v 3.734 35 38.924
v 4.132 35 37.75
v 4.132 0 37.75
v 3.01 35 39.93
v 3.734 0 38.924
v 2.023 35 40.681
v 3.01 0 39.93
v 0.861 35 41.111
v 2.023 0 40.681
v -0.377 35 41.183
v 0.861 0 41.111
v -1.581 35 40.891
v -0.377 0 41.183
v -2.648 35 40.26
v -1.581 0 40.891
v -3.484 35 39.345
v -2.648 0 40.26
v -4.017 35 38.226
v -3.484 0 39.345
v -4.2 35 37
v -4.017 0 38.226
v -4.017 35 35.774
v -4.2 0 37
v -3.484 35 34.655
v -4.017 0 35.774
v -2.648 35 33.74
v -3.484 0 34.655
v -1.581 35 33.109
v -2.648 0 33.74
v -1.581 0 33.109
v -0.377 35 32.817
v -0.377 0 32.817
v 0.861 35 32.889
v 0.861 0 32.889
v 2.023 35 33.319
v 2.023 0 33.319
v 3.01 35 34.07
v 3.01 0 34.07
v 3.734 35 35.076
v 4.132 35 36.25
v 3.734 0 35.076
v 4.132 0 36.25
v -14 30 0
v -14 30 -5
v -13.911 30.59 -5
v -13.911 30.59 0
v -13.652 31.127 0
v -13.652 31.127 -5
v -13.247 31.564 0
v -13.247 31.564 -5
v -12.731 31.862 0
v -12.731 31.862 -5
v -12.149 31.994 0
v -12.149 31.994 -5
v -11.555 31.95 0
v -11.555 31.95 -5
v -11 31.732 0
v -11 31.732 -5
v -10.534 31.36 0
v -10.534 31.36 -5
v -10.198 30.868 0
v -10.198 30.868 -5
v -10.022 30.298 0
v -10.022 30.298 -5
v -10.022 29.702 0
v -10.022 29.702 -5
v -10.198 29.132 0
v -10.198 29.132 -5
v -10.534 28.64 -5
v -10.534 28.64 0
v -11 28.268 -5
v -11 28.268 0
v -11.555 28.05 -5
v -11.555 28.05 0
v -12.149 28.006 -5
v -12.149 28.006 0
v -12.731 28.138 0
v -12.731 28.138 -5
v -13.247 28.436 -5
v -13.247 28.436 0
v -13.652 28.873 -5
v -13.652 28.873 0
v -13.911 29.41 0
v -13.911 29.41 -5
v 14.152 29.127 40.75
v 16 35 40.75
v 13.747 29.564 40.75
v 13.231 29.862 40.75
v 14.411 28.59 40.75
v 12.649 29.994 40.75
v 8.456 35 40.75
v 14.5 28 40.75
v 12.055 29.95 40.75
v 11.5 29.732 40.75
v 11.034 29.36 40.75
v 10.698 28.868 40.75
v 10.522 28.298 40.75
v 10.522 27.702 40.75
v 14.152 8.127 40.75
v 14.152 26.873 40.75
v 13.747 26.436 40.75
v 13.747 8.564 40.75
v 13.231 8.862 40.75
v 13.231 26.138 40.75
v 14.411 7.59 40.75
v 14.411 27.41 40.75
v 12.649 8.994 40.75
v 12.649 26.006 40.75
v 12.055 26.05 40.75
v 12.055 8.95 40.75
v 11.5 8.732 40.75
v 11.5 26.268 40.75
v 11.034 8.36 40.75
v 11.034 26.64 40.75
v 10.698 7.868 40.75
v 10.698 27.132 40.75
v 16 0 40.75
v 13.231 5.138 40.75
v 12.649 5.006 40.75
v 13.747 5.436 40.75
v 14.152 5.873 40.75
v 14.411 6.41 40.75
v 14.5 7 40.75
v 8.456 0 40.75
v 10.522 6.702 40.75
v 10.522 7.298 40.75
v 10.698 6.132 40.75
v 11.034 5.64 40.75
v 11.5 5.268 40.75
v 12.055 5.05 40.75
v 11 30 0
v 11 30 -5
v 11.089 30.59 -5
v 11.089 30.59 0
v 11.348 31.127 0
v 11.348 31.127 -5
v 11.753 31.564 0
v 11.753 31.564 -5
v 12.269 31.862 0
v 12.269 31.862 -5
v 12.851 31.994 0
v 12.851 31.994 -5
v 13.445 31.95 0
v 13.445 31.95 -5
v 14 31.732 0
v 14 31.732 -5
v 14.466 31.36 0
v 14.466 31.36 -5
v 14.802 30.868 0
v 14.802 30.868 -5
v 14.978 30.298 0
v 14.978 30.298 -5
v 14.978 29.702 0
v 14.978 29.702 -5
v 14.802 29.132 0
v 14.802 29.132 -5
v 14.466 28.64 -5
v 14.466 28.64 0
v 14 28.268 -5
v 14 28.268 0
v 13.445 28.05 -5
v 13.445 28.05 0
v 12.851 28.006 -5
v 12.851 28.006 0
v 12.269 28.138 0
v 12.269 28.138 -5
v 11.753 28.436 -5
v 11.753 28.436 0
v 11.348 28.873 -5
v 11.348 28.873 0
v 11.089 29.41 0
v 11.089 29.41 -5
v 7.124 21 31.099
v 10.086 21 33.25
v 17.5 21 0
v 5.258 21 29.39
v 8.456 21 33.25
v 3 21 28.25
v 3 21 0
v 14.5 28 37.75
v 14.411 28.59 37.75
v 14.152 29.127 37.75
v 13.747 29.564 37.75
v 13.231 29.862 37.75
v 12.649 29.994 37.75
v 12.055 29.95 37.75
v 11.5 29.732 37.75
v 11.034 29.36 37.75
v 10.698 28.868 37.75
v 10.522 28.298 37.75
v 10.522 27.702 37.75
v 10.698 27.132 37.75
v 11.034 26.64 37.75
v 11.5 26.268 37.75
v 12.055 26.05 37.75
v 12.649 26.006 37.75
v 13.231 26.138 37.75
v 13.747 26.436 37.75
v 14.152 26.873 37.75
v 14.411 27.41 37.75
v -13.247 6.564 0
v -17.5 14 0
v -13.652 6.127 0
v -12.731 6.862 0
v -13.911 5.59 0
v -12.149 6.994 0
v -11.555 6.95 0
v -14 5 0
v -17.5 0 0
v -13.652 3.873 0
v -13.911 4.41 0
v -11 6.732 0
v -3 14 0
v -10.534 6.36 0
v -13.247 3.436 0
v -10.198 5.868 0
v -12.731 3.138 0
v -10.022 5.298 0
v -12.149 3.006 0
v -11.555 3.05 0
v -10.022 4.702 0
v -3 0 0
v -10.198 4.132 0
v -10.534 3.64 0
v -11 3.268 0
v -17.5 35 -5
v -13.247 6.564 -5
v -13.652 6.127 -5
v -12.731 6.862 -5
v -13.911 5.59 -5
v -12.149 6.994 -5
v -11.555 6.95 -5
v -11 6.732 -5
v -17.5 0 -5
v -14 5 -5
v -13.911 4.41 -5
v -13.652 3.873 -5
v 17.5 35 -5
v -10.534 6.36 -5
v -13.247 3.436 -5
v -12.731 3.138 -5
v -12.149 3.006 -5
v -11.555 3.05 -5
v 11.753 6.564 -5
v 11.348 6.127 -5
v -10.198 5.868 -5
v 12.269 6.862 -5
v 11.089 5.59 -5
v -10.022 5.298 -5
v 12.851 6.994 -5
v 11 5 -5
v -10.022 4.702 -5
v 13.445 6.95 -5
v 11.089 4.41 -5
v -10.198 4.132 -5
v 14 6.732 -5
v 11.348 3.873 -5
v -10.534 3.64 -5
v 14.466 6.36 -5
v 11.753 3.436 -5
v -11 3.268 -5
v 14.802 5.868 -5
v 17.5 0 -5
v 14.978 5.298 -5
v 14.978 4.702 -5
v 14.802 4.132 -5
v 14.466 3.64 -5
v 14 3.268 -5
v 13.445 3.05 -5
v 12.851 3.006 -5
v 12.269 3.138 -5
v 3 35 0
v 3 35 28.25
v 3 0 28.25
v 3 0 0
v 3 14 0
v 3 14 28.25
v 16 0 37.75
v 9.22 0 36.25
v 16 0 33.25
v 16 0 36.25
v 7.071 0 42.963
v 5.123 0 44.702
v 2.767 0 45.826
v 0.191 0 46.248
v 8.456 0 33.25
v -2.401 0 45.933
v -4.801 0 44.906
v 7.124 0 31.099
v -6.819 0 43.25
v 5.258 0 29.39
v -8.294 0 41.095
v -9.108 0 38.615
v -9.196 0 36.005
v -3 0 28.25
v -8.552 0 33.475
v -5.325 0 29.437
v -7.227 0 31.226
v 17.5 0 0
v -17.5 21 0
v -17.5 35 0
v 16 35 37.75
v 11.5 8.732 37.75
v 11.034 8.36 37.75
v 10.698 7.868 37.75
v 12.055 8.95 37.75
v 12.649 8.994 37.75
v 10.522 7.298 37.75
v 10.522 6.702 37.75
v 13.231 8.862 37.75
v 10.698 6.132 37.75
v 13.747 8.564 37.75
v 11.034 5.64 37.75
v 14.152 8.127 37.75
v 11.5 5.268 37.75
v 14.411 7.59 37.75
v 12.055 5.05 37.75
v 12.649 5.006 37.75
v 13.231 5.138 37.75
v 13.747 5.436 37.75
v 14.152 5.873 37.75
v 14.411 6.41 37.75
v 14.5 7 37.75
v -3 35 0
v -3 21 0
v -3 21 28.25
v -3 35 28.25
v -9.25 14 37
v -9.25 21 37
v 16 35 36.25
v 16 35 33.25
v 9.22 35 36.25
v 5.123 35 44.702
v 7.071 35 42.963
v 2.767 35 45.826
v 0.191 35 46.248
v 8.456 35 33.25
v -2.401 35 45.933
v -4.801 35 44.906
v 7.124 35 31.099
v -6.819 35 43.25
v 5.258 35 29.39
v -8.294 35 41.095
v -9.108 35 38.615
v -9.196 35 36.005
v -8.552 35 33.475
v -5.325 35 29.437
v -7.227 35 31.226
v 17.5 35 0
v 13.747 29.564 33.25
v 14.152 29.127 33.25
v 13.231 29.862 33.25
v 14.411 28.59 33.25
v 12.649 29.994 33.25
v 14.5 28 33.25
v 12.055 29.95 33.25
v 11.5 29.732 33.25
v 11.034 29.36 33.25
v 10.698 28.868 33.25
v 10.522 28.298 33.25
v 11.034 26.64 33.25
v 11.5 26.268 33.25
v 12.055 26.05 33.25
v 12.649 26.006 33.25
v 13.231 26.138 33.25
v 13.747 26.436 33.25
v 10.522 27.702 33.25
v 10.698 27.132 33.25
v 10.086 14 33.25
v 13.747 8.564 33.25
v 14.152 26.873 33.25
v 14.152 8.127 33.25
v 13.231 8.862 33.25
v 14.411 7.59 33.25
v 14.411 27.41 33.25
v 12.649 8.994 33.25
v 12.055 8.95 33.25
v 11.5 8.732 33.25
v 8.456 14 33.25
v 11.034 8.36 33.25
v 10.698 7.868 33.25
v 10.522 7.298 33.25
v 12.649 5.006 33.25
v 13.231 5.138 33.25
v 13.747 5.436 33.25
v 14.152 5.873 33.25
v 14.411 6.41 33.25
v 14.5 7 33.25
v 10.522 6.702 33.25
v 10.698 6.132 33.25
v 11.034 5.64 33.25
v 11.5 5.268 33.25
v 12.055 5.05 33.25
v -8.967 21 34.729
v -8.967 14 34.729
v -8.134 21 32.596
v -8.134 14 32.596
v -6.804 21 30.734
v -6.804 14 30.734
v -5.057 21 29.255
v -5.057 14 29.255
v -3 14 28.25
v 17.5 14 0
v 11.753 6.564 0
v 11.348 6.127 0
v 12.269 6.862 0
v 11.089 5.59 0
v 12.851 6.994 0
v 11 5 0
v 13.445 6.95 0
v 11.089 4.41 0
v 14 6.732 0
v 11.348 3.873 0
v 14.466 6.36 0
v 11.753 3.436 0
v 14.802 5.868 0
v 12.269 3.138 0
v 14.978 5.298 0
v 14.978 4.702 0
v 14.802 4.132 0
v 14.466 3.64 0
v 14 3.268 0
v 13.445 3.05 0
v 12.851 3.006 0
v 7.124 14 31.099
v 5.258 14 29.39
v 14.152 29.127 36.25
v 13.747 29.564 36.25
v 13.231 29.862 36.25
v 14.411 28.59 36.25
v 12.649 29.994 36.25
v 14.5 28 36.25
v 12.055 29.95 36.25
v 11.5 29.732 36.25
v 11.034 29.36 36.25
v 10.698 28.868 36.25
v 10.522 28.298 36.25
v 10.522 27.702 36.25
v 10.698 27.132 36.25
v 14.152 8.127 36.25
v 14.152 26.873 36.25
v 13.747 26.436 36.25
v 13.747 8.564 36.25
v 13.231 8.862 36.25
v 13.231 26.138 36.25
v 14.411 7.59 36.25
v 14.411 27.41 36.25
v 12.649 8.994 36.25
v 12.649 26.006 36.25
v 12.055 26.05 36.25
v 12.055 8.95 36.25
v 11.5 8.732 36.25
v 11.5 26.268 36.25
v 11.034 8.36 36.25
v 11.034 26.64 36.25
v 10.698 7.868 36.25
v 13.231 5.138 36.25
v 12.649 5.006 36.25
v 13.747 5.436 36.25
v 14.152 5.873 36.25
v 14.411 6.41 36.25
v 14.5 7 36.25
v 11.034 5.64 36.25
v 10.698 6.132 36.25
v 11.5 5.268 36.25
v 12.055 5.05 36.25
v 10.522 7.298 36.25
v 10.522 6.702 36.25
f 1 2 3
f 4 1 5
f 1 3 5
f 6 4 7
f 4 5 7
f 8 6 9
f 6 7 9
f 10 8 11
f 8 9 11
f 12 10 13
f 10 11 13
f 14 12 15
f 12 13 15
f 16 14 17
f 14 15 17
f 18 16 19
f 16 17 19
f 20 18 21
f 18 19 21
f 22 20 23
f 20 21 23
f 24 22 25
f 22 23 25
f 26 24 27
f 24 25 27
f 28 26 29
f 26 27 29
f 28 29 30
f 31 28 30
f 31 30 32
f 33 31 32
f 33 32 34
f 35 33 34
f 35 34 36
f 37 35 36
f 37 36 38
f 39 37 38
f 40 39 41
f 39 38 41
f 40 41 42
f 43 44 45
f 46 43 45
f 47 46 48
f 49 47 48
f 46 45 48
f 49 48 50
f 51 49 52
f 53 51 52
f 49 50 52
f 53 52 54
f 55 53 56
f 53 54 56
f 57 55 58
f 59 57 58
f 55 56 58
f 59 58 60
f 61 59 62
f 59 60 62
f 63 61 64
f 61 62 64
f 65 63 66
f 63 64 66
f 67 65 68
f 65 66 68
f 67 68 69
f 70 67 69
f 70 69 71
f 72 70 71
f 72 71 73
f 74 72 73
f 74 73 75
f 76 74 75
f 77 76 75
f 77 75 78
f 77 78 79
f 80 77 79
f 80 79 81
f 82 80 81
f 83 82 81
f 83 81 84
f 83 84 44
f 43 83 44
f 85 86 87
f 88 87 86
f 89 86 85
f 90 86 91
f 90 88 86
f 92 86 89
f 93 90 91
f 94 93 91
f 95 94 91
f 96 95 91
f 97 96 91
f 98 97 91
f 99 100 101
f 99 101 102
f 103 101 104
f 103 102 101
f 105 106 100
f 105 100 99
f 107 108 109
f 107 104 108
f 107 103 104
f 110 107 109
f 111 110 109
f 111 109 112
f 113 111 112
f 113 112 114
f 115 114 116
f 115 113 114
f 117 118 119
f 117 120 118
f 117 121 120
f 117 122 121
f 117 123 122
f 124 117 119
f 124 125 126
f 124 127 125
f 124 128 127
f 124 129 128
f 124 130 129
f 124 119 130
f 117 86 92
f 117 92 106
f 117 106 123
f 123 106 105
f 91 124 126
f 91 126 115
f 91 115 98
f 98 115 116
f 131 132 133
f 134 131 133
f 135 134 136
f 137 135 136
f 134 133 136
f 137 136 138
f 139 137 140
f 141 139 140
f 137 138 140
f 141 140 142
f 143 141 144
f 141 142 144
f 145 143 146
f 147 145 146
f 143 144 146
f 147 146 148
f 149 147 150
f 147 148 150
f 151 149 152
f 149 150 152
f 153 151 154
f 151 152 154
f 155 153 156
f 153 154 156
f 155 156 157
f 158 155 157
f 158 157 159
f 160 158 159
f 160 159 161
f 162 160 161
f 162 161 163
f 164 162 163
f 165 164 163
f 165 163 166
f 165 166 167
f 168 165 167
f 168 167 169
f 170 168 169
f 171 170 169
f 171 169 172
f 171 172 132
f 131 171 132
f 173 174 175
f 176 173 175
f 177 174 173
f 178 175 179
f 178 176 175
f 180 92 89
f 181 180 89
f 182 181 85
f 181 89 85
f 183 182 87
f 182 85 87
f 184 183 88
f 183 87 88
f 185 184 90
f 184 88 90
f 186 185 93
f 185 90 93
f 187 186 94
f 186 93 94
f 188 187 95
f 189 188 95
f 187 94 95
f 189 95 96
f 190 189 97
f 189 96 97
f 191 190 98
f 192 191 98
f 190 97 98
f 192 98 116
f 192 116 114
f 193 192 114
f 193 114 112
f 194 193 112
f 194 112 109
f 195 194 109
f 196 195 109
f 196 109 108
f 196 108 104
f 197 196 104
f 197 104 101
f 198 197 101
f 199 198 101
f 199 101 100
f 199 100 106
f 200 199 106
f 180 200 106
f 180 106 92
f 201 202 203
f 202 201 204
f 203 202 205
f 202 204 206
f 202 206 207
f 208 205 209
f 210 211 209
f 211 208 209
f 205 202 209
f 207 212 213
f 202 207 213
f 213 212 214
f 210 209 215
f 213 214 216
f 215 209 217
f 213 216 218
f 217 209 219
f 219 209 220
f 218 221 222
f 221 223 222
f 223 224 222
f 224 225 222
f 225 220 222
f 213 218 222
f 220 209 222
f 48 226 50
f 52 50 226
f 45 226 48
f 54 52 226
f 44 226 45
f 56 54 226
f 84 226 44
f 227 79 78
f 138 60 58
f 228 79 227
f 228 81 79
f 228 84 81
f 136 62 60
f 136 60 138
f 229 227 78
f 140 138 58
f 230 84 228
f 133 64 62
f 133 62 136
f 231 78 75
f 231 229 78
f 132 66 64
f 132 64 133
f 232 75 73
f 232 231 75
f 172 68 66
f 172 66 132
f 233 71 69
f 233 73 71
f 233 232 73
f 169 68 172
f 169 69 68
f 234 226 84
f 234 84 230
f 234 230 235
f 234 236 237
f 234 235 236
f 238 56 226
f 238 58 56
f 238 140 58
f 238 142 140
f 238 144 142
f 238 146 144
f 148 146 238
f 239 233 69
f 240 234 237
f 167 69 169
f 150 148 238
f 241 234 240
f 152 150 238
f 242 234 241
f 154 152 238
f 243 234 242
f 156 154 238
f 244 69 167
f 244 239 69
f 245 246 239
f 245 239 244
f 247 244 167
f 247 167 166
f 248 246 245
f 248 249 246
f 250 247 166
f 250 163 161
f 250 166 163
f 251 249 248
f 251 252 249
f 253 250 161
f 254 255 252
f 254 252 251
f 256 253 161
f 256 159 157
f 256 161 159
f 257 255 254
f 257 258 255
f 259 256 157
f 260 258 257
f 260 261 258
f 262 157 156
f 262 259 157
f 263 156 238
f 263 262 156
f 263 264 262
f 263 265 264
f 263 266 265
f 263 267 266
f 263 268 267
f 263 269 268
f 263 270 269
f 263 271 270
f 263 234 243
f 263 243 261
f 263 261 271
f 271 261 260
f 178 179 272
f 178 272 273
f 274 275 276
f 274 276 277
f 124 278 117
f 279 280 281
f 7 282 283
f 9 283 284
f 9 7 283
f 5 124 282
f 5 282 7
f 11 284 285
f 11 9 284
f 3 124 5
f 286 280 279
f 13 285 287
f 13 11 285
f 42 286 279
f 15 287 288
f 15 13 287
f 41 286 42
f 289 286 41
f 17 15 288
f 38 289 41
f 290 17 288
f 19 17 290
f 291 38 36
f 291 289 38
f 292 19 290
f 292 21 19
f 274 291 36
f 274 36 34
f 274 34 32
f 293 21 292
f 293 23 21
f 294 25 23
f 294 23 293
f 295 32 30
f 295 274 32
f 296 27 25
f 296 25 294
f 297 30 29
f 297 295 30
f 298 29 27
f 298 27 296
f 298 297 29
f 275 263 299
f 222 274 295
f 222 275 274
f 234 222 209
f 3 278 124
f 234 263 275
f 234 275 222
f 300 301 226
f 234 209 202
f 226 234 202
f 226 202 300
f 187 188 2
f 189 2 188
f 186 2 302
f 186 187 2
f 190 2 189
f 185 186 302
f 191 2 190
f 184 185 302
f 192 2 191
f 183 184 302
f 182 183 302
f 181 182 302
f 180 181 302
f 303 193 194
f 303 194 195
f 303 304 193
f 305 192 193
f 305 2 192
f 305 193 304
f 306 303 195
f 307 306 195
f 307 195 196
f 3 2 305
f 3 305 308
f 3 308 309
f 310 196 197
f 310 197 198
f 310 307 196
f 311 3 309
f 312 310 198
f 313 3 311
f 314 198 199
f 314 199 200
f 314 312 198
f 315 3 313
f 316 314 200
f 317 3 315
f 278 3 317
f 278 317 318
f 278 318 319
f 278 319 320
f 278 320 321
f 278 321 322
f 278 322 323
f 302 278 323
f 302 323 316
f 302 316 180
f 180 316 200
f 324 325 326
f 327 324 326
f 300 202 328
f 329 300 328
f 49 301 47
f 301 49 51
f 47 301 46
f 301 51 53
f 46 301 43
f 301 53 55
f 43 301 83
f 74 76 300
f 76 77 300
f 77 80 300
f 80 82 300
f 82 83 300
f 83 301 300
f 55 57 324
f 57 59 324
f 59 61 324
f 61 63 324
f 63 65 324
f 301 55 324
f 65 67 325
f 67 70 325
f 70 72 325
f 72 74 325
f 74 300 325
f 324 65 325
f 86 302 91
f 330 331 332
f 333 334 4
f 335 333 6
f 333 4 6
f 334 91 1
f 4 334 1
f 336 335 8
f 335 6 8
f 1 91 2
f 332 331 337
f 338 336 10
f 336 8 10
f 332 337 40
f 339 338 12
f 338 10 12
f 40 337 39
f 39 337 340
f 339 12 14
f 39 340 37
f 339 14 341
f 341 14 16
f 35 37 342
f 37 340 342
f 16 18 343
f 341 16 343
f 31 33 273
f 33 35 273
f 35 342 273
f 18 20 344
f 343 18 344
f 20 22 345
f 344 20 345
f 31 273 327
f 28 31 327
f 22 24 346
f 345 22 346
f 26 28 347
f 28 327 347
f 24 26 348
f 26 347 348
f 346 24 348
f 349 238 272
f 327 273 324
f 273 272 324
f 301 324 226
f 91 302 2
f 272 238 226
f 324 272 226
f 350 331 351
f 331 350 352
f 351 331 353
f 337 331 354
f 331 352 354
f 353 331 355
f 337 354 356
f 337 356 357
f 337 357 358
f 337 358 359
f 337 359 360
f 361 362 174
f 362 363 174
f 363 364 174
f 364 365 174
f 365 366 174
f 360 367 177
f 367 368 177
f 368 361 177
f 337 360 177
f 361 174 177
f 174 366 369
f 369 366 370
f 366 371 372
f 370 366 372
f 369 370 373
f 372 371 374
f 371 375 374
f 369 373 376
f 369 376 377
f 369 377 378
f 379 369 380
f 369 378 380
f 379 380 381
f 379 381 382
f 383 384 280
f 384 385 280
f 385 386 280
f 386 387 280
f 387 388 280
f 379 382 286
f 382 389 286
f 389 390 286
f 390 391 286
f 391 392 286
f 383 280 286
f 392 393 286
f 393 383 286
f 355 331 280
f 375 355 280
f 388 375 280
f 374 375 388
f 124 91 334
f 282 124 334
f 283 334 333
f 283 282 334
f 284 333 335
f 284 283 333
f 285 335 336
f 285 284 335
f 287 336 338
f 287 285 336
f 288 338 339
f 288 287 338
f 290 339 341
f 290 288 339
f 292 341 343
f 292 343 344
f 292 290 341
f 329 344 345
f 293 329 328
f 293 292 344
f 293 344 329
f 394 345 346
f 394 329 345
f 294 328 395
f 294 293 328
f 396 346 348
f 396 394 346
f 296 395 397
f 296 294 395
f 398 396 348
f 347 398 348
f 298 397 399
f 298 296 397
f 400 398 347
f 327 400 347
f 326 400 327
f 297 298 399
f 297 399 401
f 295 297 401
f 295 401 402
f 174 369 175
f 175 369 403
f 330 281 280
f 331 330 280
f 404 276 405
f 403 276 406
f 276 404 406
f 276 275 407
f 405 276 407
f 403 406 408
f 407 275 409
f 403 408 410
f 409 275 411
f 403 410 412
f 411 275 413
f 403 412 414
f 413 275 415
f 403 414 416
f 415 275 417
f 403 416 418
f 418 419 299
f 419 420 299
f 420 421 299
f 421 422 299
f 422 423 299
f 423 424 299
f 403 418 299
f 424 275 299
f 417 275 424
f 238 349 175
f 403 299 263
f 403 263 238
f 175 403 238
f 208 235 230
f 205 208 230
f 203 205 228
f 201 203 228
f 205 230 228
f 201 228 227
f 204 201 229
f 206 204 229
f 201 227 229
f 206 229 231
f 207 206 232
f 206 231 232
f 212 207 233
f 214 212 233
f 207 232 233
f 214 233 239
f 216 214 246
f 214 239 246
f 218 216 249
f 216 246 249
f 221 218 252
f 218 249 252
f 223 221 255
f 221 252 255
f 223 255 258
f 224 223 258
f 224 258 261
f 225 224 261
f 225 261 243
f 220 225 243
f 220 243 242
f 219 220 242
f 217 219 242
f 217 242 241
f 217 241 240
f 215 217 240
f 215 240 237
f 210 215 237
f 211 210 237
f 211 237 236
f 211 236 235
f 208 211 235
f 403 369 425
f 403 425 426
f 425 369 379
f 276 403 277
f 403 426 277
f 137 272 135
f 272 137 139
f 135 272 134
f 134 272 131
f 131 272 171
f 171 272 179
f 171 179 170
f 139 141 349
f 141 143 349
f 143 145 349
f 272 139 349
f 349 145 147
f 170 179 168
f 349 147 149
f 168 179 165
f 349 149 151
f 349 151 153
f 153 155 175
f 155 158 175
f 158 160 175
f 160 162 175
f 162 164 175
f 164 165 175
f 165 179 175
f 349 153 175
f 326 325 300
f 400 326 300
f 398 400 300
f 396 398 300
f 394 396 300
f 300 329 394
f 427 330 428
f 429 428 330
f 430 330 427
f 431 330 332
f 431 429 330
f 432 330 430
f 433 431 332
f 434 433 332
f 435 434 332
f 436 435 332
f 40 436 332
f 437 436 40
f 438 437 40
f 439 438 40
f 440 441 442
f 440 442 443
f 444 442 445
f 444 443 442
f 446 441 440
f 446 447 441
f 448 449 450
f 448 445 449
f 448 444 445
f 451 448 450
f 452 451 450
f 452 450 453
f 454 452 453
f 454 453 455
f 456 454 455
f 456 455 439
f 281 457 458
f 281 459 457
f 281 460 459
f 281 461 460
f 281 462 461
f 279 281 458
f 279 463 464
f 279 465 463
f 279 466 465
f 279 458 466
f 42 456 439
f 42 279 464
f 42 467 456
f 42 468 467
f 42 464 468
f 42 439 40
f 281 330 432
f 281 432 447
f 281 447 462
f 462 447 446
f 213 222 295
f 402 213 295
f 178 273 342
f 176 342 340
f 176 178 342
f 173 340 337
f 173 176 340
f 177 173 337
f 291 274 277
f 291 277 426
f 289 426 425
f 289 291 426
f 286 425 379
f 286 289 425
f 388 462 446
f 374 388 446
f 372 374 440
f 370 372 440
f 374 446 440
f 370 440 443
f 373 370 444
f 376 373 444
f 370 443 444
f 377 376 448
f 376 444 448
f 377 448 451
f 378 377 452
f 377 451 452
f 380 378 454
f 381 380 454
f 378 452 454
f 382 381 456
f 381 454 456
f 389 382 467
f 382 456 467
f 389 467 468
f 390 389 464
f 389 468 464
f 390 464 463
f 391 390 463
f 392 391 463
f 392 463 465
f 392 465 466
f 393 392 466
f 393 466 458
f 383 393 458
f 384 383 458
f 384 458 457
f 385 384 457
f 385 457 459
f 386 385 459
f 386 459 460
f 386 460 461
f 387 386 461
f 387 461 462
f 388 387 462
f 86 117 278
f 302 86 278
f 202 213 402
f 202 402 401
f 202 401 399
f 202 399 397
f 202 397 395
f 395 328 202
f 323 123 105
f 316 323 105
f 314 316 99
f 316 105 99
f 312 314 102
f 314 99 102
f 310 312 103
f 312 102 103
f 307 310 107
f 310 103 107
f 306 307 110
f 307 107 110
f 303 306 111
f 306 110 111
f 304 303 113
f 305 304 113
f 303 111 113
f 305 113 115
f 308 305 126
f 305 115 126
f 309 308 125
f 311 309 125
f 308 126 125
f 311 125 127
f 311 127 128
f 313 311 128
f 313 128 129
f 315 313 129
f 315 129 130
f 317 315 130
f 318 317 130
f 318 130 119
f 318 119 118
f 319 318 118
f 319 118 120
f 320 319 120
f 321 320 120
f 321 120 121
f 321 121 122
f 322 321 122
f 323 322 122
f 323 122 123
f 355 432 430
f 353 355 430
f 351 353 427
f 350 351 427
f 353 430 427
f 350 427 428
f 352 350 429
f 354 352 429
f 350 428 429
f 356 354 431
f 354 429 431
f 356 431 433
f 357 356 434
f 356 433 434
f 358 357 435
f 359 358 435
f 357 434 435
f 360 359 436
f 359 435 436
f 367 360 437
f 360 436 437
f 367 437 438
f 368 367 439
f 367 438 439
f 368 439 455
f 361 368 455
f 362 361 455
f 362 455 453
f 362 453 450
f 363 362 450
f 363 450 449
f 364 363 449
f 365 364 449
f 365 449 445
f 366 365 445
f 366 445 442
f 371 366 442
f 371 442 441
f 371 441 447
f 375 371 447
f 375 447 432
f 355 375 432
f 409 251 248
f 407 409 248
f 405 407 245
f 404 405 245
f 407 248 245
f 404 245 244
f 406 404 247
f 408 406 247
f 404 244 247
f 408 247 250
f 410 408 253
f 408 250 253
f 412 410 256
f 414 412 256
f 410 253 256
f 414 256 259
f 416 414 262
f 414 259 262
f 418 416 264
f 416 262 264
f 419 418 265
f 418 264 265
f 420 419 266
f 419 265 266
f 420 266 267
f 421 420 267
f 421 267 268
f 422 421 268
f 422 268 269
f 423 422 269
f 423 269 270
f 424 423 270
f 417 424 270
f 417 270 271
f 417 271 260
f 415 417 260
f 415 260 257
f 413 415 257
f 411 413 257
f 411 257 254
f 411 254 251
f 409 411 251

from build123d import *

# Parameters (mm, degrees)
SZKIC2_W                    = 35
SZKIC2_H                    = 5
DODANIE_WYCI_GNI_CIE1_DEPTH = 35
SZKIC3_R                    = 9.25
SZKIC3_R_2                  = 4.2
DODANIE_WYCI_GNI_CIE2_DEPTH = 35
SZKIC4_W                    = 6
SZKIC4_H                    = 30.71029356
DODANIE_WYCI_GNI_CIE3_DEPTH = 35
DODANIE_WYCI_GNI_CIE4_START = -14
DODANIE_WYCI_GNI_CIE4_DEPTH = 7
WYTNIJ_WYCI_GNI_CIE1_REACH  = 66.481
SZKIC7_R                    = 2
WYTNIJ_WYCI_GNI_CIE2_REACH  = 62.583
SZKIC8_W                    = 10.637888195
SZKIC8_H                    = 1.500000817
SZKIC11_W                   = 9.672485651
SZKIC11_H                   = 3
SZKIC11_H_2                 = 2.999999183
DODANIE_WYCI_GNI_CIE6_DEPTH = 35
SZKIC12_R                   = 2
WYTNIJ_WYCI_GNI_CIE4_DEPTH  = 12


with BuildPart() as part:
    # Szkic2 → Dodanie-wyciągnięcie1 (new body)
    with BuildSketch(Plane(origin=(0, 0, 0), x_dir=(1, 0, 0), z_dir=(0, 1, 0))):
        with Locations((0, 2.5)):
            Rectangle(SZKIC2_W, SZKIC2_H)
    extrude(amount=DODANIE_WYCI_GNI_CIE1_DEPTH)



with BuildPart() as body_2:
    # Szkic3 → Dodanie-wyciągnięcie2 (new body)
    with BuildSketch(Plane.XZ):
        with Locations(Location((0, 37, 0), (0, 0, 270))):
            Circle(SZKIC3_R)
        with Locations(Location((0, 37, 0), (0, 0, 270))):
            Circle(SZKIC3_R_2, mode=Mode.SUBTRACT)
    extrude(amount=-DODANIE_WYCI_GNI_CIE2_DEPTH)


with BuildPart() as part_1:
    add(part.part)

    add(body_2.part)  # Dodanie-wyciągnięcie3 merges body 2
    # Szkic4 → Dodanie-wyciągnięcie3 (add)
    with BuildSketch(Plane.XZ):
        with Locations((0, 15.35514678)):
            Rectangle(SZKIC4_W, SZKIC4_H)
    extrude(amount=-DODANIE_WYCI_GNI_CIE3_DEPTH)

    # Szkic5 → Dodanie-wyciągnięcie4 (add)
    with BuildSketch(Plane.XZ.offset(DODANIE_WYCI_GNI_CIE4_START)):
        Polygon((0, 0), (-17.5, 0), (-9.25, 37), (-3, 28.25), align=None)
        Polygon((3, 0), (3, 28.25), (9.25, 37), (17.5, 0), align=None)
    extrude(amount=-DODANIE_WYCI_GNI_CIE4_DEPTH)

    # Szkic7 → Wytnij-wyciągnięcie1 (cut, up to next)
    with BuildSketch(Plane(origin=(0, 0, -5), x_dir=(-1, 0, 0), z_dir=(0, 0, -1)), mode=Mode.PRIVATE) as wytnij_wyci_gni_cie1_sk1:
        with Locations((-13, 30)):
            Circle(SZKIC7_R)
    wytnij_wyci_gni_cie1_tool1 = extrude(wytnij_wyci_gni_cie1_sk1.sketch, amount=-WYTNIJ_WYCI_GNI_CIE1_REACH, mode=Mode.PRIVATE) & part_1.part
    # Szkic7 → Wytnij-wyciągnięcie1 (cut, up to next)
    with BuildSketch(Plane(origin=(0, 0, -5), x_dir=(-1, 0, 0), z_dir=(0, 0, -1)), mode=Mode.PRIVATE) as wytnij_wyci_gni_cie1_sk2:
        with Locations((12, 30)):
            Circle(SZKIC7_R)
    wytnij_wyci_gni_cie1_tool2 = extrude(wytnij_wyci_gni_cie1_sk2.sketch, amount=-WYTNIJ_WYCI_GNI_CIE1_REACH, mode=Mode.PRIVATE) & part_1.part
    # Szkic7 → Wytnij-wyciągnięcie1 (cut, up to next)
    with BuildSketch(Plane(origin=(0, 0, -5), x_dir=(-1, 0, 0), z_dir=(0, 0, -1)), mode=Mode.PRIVATE) as wytnij_wyci_gni_cie1_sk3:
        with Locations((12, 5)):
            Circle(SZKIC7_R)
    wytnij_wyci_gni_cie1_tool3 = extrude(wytnij_wyci_gni_cie1_sk3.sketch, amount=-WYTNIJ_WYCI_GNI_CIE1_REACH, mode=Mode.PRIVATE) & part_1.part
    # Szkic7 → Wytnij-wyciągnięcie1 (cut, up to next)
    with BuildSketch(Plane(origin=(0, 0, -5), x_dir=(-1, 0, 0), z_dir=(0, 0, -1)), mode=Mode.PRIVATE) as wytnij_wyci_gni_cie1_sk4:
        with Locations((-13, 5)):
            Circle(SZKIC7_R)
    wytnij_wyci_gni_cie1_tool4 = extrude(wytnij_wyci_gni_cie1_sk4.sketch, amount=-WYTNIJ_WYCI_GNI_CIE1_REACH, mode=Mode.PRIVATE) & part_1.part
    add(wytnij_wyci_gni_cie1_tool1.solids().sort_by_distance((13, 30, -5))[0], mode=Mode.SUBTRACT)
    add(wytnij_wyci_gni_cie1_tool2.solids().sort_by_distance((-12, 30, -5))[0], mode=Mode.SUBTRACT)
    add(wytnij_wyci_gni_cie1_tool3.solids().sort_by_distance((-12, 5, -5))[0], mode=Mode.SUBTRACT)
    add(wytnij_wyci_gni_cie1_tool4.solids().sort_by_distance((13, 5, -5))[0], mode=Mode.SUBTRACT)

    # Szkic8 → Wytnij-wyciągnięcie2 (cut, up to next)
    with BuildSketch(Plane.XZ, mode=Mode.PRIVATE) as wytnij_wyci_gni_cie2_sk1:
        with Locations((9.451437144, 37.000000409)):
            Rectangle(SZKIC8_W, SZKIC8_H)
    wytnij_wyci_gni_cie2_tool1 = extrude(wytnij_wyci_gni_cie2_sk1.sketch, amount=-WYTNIJ_WYCI_GNI_CIE2_REACH, mode=Mode.PRIVATE) & part_1.part
    add(wytnij_wyci_gni_cie2_tool1.solids().sort_by_distance((9.451437, 0, 37))[0], mode=Mode.SUBTRACT)

    # Szkic11 → Dodanie-wyciągnięcie6 (add)
    with BuildSketch(Plane(origin=(0, 0, 0), x_dir=(-1, 0, 0), z_dir=(0, -1, 0))):
        with Locations((-11.163757175, -34.75)):
            Rectangle(SZKIC11_W, SZKIC11_H)
        with Locations((-11.163757175, -39.250000409)):
            Rectangle(SZKIC11_W, SZKIC11_H_2)
    extrude(amount=-DODANIE_WYCI_GNI_CIE6_DEPTH)

    # Szkic12 → Wytnij-wyciągnięcie4 (cut)
    with BuildSketch(Plane.XY.offset(40.75)):
        with Locations((12.5, 28)):
            Circle(SZKIC12_R)
        with Locations((12.5, 7)):
            Circle(SZKIC12_R)
    extrude(amount=-WYTNIJ_WYCI_GNI_CIE4_DEPTH, mode=Mode.SUBTRACT)


solid = part_1.part
